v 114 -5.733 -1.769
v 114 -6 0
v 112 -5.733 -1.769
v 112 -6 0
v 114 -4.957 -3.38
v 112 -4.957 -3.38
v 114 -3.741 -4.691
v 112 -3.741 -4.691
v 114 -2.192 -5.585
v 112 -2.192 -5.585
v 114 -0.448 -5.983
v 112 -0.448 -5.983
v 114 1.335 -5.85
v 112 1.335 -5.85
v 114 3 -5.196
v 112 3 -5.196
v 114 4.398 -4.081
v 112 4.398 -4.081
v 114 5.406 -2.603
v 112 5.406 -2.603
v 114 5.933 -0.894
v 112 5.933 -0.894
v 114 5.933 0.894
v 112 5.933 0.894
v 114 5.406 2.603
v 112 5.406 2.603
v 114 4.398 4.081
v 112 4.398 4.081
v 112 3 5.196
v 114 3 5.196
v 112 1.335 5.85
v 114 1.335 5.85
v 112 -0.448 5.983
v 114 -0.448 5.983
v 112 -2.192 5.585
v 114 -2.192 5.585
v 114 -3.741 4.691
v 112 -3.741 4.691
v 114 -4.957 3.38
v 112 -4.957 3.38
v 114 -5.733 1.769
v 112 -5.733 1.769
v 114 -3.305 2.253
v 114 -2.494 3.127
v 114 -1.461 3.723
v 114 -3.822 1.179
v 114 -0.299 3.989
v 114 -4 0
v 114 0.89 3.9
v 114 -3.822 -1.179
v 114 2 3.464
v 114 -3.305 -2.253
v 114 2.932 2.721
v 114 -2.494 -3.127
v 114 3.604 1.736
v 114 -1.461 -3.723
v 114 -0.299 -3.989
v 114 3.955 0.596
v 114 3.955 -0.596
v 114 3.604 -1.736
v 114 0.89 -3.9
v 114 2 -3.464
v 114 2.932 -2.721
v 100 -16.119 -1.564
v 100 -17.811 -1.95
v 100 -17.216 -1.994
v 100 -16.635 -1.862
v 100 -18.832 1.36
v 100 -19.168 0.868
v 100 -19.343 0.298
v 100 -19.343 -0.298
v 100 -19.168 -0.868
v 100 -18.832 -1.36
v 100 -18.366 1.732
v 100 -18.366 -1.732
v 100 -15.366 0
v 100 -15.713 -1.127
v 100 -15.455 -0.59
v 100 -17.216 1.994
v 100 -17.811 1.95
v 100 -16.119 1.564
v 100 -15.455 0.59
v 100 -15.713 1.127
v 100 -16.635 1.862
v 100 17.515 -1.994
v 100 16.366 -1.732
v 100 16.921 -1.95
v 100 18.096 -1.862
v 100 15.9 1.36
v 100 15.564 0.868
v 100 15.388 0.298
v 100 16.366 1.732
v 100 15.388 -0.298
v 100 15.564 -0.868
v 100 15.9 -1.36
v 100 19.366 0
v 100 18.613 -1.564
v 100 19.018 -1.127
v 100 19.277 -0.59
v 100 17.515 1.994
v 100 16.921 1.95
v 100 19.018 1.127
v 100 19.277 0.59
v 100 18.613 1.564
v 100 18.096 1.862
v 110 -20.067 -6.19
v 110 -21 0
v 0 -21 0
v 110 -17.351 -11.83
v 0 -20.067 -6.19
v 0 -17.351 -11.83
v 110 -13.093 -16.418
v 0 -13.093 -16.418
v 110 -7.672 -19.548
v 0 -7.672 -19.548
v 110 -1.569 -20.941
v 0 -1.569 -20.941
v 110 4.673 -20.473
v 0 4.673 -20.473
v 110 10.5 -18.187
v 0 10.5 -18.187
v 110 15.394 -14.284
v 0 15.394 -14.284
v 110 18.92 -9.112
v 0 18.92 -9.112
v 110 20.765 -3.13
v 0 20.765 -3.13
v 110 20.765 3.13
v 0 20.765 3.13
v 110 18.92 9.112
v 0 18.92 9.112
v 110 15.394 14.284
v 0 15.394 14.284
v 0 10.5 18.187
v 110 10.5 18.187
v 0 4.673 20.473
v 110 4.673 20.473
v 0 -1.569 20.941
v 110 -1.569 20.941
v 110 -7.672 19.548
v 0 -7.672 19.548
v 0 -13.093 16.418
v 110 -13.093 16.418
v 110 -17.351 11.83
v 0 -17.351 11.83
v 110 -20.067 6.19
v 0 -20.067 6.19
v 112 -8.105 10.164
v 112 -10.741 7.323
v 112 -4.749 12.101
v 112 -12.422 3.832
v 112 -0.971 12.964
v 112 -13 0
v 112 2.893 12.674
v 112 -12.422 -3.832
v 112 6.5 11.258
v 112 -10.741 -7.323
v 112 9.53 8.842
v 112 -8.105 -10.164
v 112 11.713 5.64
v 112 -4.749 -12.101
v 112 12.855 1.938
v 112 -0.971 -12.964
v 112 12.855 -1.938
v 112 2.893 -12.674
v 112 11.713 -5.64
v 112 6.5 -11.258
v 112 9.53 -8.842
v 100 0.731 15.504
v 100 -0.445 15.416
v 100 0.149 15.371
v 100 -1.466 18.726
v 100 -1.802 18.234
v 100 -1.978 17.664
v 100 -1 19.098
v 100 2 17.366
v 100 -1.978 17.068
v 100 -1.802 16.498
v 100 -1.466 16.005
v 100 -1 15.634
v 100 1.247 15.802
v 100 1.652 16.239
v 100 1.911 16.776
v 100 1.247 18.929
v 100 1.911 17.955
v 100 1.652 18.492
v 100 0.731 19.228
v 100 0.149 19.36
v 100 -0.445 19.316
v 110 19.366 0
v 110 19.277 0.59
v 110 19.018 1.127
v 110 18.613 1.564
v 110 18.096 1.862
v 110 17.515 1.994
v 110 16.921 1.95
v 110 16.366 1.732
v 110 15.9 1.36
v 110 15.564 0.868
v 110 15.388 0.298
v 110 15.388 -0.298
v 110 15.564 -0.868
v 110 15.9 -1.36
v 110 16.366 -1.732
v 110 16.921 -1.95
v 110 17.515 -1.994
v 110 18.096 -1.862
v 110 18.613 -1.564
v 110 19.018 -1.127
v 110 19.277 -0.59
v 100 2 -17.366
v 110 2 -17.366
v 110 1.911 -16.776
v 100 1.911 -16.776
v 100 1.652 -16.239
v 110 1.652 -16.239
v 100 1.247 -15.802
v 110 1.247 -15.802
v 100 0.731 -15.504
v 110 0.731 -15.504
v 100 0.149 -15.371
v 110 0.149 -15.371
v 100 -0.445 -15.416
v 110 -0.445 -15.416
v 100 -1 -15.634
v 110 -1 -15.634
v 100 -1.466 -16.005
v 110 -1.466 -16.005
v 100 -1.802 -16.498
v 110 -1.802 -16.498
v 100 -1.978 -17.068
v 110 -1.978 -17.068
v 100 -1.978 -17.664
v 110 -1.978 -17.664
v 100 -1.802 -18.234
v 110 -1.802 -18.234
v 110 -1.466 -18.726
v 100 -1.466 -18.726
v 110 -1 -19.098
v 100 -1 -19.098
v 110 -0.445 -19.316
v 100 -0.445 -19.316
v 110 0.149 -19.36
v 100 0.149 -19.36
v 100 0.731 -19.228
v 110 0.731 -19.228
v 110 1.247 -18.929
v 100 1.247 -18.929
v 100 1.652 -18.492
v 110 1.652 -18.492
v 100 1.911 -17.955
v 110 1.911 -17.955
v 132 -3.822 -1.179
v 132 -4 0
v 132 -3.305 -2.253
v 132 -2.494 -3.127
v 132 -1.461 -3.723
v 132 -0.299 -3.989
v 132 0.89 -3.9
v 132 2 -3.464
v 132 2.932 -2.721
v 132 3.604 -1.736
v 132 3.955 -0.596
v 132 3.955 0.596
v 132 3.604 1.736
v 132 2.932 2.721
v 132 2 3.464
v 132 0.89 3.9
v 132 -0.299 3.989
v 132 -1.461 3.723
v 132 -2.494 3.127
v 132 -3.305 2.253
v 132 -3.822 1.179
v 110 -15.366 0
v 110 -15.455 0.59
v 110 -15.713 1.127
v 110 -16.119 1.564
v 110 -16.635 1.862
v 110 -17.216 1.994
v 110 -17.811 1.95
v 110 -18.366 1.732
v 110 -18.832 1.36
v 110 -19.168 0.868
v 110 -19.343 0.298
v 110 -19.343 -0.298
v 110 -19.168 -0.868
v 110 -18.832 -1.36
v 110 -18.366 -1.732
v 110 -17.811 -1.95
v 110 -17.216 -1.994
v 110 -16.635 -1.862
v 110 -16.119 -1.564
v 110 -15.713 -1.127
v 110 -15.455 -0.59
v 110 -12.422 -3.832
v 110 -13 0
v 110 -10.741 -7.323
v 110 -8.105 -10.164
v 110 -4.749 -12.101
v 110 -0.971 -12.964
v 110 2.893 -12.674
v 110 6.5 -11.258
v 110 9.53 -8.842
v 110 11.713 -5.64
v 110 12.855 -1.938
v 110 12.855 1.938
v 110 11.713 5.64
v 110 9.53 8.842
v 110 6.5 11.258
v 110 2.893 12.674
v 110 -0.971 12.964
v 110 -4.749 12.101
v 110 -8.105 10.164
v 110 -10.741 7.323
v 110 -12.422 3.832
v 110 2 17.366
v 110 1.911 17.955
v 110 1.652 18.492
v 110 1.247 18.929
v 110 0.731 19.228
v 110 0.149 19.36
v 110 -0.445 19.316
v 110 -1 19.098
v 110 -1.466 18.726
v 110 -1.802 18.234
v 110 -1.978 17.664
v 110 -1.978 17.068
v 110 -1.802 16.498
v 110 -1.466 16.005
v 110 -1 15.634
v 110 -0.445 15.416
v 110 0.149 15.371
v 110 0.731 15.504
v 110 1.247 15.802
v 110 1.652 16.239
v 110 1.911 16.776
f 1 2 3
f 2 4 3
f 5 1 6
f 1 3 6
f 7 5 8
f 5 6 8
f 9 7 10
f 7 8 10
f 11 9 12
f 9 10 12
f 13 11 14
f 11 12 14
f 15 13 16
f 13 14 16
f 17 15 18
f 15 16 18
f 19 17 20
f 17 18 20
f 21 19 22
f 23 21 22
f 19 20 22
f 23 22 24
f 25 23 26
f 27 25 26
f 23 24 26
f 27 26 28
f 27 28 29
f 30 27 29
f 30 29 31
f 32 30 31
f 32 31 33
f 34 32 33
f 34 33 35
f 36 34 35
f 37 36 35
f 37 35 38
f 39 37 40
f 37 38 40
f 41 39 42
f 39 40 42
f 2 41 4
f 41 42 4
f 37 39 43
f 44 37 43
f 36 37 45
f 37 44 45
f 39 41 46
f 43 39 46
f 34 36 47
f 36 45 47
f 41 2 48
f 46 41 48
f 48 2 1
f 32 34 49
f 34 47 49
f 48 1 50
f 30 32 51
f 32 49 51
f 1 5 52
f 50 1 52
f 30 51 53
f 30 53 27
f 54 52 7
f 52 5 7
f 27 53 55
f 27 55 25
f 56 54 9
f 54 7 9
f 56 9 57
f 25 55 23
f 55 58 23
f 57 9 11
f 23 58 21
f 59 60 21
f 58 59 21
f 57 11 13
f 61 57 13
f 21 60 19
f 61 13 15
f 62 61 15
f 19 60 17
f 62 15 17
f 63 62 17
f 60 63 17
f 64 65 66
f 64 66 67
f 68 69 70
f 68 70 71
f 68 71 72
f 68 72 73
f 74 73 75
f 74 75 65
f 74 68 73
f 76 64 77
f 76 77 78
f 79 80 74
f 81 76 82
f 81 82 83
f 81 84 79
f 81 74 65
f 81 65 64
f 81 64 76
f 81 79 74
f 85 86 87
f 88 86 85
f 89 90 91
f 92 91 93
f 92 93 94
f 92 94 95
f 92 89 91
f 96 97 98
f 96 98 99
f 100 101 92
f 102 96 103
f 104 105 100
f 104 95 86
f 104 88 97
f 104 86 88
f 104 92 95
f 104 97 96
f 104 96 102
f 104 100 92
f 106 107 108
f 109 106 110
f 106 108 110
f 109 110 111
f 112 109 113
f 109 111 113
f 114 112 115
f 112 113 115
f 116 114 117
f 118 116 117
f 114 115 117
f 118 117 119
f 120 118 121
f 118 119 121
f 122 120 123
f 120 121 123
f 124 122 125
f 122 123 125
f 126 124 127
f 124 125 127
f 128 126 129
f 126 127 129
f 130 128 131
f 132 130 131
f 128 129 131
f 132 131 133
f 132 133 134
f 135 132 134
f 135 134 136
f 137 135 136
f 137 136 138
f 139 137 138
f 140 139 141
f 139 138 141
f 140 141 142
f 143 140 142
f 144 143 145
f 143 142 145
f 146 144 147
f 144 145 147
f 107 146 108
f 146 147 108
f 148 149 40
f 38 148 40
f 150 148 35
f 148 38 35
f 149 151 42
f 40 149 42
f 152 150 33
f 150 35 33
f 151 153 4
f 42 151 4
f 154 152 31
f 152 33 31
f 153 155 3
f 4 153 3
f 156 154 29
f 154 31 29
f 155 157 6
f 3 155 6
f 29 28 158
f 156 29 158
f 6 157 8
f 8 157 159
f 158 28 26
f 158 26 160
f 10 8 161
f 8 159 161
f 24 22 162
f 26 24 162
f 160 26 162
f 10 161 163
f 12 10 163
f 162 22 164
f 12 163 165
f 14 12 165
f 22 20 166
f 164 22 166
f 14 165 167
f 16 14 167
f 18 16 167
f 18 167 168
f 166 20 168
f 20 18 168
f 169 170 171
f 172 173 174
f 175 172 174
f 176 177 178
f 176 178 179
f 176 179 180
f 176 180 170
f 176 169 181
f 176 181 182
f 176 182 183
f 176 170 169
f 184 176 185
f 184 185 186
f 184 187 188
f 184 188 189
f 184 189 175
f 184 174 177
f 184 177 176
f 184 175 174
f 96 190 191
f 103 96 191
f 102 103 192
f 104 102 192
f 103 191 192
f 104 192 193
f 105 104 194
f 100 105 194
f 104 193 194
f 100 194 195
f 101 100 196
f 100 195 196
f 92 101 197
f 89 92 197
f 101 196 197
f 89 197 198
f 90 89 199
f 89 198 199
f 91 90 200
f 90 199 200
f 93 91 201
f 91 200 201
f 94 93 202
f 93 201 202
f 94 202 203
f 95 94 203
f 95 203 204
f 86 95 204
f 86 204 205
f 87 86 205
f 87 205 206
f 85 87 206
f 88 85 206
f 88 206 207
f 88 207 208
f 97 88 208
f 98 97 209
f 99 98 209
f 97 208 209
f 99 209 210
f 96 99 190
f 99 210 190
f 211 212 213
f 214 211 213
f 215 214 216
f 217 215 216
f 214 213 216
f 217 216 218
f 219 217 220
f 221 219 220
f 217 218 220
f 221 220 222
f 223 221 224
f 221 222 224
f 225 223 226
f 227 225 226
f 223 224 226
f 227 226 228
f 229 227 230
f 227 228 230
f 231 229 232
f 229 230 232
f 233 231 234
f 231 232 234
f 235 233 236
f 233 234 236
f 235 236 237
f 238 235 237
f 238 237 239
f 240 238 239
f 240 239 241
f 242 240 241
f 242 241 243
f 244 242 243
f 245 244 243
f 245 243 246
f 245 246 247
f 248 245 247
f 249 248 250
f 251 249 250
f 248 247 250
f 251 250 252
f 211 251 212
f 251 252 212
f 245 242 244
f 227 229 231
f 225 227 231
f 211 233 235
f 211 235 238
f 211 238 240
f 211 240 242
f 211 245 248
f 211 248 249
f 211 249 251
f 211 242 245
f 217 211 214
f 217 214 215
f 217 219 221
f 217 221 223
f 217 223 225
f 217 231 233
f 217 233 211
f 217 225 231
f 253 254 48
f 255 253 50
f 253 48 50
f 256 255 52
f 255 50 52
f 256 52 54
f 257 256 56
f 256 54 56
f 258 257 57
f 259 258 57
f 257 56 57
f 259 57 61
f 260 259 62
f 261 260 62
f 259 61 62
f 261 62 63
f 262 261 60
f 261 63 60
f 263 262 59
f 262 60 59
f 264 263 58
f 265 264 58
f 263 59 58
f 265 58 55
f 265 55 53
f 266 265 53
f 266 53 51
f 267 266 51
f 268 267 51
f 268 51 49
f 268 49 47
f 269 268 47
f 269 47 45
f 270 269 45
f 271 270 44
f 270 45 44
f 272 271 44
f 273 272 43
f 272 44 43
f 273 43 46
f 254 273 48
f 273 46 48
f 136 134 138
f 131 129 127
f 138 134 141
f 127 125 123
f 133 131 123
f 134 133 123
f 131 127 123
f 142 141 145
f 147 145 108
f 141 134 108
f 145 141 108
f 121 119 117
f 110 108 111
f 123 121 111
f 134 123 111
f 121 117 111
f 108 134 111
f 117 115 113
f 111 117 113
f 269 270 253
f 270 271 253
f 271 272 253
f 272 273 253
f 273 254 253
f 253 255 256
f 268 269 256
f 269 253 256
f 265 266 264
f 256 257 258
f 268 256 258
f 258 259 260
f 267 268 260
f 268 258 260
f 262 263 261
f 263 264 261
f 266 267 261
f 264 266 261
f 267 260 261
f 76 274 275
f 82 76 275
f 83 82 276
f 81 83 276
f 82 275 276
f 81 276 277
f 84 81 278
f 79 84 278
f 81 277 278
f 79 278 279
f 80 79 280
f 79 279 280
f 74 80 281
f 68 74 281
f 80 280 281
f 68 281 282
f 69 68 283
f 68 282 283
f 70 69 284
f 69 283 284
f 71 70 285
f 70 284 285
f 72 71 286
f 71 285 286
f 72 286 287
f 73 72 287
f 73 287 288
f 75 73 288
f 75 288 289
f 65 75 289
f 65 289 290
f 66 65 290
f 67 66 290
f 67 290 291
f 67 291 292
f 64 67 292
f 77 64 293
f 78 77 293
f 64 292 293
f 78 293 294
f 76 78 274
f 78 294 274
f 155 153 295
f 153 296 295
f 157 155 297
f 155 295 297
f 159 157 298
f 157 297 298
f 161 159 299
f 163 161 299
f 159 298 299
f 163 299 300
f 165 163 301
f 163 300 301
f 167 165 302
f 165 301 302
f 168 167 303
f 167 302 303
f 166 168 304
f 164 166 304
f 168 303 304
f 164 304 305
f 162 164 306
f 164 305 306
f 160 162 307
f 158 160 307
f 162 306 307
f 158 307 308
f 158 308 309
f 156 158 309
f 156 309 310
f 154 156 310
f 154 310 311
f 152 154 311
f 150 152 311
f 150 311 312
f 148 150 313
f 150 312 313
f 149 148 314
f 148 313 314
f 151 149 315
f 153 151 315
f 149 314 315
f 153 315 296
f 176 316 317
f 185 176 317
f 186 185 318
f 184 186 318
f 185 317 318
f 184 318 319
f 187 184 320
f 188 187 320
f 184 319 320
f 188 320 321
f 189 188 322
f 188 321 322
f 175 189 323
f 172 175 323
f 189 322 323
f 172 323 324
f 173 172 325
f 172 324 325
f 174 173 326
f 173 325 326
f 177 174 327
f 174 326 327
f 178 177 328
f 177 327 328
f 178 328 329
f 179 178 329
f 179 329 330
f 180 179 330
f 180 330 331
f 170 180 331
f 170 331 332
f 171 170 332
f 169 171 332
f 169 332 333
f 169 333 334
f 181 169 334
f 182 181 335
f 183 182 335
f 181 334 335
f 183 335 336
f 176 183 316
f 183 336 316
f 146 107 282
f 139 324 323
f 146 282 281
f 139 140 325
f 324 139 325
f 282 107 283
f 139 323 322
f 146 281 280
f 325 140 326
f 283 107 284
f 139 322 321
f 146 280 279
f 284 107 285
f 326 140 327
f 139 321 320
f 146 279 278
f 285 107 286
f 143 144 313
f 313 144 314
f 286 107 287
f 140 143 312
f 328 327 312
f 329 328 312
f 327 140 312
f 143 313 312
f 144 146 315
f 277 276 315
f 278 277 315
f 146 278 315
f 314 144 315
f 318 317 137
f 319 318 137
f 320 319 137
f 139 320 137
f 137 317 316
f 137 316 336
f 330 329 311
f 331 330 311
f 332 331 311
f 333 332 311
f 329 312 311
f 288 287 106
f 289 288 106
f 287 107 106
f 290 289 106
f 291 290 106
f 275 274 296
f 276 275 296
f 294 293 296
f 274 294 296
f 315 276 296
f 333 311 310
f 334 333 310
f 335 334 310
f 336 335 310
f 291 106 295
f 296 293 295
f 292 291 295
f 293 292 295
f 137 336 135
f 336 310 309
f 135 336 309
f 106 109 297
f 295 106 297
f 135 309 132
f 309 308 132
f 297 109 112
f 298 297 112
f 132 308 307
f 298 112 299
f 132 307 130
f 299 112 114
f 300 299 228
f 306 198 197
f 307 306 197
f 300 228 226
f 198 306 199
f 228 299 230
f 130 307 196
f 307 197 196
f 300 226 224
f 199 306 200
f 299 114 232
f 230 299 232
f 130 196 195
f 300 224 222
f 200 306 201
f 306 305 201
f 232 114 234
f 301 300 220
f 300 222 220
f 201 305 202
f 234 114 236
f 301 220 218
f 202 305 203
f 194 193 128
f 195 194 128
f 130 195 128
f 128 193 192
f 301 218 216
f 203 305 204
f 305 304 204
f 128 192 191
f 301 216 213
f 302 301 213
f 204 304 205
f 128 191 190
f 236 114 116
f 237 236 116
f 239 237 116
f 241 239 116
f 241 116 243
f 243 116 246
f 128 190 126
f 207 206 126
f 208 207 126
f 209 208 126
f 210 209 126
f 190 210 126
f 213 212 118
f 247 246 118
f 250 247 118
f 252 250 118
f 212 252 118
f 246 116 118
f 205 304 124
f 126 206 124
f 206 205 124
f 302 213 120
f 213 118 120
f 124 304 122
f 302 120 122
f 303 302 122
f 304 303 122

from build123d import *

# Parameters (mm, degrees)
SKETCH2_R          = 2
CUT_EXTRUDE1_DEPTH = 10


with BuildPart() as part:
    # Sketch1 → Revolve1 (revolve)
    with BuildSketch(Plane.XY, mode=Mode.PRIVATE) as revolve1_sk:
        Polygon((0, 0), (132, 0), (132, 4), (114, 4), (114, 6), (112, 6), (112, 13), (110, 13), (110, 21), (0, 21), align=None)
    revolve(revolve1_sk.sketch.rotate(Axis((0, 0, 0), (1, 0, 0)), 180), axis=Axis((0, 0, 0), (1, 0, 0)))

    # Sketch2 → Cut-Extrude1 (cut)
    with BuildSketch(Plane(origin=(110, 0, 0), x_dir=(0, 0, -1), z_dir=(1, 0, 0))):
        with Locations(Location((0, 17.365813997, 0), (0, 0, 90))):
            Circle(SKETCH2_R)
        with Locations(Location((17.365813997, 0, 0), (0, 0, 90))):
            Circle(SKETCH2_R)
        with Locations(Location((0, -17.365813997, 0), (0, 0, 90))):
            Circle(SKETCH2_R)
        with Locations(Location((-17.365813997, 0, 0), (0, 0, 90))):
            Circle(SKETCH2_R)
    extrude(amount=-CUT_EXTRUDE1_DEPTH, mode=Mode.SUBTRACT)


solid = part.part
